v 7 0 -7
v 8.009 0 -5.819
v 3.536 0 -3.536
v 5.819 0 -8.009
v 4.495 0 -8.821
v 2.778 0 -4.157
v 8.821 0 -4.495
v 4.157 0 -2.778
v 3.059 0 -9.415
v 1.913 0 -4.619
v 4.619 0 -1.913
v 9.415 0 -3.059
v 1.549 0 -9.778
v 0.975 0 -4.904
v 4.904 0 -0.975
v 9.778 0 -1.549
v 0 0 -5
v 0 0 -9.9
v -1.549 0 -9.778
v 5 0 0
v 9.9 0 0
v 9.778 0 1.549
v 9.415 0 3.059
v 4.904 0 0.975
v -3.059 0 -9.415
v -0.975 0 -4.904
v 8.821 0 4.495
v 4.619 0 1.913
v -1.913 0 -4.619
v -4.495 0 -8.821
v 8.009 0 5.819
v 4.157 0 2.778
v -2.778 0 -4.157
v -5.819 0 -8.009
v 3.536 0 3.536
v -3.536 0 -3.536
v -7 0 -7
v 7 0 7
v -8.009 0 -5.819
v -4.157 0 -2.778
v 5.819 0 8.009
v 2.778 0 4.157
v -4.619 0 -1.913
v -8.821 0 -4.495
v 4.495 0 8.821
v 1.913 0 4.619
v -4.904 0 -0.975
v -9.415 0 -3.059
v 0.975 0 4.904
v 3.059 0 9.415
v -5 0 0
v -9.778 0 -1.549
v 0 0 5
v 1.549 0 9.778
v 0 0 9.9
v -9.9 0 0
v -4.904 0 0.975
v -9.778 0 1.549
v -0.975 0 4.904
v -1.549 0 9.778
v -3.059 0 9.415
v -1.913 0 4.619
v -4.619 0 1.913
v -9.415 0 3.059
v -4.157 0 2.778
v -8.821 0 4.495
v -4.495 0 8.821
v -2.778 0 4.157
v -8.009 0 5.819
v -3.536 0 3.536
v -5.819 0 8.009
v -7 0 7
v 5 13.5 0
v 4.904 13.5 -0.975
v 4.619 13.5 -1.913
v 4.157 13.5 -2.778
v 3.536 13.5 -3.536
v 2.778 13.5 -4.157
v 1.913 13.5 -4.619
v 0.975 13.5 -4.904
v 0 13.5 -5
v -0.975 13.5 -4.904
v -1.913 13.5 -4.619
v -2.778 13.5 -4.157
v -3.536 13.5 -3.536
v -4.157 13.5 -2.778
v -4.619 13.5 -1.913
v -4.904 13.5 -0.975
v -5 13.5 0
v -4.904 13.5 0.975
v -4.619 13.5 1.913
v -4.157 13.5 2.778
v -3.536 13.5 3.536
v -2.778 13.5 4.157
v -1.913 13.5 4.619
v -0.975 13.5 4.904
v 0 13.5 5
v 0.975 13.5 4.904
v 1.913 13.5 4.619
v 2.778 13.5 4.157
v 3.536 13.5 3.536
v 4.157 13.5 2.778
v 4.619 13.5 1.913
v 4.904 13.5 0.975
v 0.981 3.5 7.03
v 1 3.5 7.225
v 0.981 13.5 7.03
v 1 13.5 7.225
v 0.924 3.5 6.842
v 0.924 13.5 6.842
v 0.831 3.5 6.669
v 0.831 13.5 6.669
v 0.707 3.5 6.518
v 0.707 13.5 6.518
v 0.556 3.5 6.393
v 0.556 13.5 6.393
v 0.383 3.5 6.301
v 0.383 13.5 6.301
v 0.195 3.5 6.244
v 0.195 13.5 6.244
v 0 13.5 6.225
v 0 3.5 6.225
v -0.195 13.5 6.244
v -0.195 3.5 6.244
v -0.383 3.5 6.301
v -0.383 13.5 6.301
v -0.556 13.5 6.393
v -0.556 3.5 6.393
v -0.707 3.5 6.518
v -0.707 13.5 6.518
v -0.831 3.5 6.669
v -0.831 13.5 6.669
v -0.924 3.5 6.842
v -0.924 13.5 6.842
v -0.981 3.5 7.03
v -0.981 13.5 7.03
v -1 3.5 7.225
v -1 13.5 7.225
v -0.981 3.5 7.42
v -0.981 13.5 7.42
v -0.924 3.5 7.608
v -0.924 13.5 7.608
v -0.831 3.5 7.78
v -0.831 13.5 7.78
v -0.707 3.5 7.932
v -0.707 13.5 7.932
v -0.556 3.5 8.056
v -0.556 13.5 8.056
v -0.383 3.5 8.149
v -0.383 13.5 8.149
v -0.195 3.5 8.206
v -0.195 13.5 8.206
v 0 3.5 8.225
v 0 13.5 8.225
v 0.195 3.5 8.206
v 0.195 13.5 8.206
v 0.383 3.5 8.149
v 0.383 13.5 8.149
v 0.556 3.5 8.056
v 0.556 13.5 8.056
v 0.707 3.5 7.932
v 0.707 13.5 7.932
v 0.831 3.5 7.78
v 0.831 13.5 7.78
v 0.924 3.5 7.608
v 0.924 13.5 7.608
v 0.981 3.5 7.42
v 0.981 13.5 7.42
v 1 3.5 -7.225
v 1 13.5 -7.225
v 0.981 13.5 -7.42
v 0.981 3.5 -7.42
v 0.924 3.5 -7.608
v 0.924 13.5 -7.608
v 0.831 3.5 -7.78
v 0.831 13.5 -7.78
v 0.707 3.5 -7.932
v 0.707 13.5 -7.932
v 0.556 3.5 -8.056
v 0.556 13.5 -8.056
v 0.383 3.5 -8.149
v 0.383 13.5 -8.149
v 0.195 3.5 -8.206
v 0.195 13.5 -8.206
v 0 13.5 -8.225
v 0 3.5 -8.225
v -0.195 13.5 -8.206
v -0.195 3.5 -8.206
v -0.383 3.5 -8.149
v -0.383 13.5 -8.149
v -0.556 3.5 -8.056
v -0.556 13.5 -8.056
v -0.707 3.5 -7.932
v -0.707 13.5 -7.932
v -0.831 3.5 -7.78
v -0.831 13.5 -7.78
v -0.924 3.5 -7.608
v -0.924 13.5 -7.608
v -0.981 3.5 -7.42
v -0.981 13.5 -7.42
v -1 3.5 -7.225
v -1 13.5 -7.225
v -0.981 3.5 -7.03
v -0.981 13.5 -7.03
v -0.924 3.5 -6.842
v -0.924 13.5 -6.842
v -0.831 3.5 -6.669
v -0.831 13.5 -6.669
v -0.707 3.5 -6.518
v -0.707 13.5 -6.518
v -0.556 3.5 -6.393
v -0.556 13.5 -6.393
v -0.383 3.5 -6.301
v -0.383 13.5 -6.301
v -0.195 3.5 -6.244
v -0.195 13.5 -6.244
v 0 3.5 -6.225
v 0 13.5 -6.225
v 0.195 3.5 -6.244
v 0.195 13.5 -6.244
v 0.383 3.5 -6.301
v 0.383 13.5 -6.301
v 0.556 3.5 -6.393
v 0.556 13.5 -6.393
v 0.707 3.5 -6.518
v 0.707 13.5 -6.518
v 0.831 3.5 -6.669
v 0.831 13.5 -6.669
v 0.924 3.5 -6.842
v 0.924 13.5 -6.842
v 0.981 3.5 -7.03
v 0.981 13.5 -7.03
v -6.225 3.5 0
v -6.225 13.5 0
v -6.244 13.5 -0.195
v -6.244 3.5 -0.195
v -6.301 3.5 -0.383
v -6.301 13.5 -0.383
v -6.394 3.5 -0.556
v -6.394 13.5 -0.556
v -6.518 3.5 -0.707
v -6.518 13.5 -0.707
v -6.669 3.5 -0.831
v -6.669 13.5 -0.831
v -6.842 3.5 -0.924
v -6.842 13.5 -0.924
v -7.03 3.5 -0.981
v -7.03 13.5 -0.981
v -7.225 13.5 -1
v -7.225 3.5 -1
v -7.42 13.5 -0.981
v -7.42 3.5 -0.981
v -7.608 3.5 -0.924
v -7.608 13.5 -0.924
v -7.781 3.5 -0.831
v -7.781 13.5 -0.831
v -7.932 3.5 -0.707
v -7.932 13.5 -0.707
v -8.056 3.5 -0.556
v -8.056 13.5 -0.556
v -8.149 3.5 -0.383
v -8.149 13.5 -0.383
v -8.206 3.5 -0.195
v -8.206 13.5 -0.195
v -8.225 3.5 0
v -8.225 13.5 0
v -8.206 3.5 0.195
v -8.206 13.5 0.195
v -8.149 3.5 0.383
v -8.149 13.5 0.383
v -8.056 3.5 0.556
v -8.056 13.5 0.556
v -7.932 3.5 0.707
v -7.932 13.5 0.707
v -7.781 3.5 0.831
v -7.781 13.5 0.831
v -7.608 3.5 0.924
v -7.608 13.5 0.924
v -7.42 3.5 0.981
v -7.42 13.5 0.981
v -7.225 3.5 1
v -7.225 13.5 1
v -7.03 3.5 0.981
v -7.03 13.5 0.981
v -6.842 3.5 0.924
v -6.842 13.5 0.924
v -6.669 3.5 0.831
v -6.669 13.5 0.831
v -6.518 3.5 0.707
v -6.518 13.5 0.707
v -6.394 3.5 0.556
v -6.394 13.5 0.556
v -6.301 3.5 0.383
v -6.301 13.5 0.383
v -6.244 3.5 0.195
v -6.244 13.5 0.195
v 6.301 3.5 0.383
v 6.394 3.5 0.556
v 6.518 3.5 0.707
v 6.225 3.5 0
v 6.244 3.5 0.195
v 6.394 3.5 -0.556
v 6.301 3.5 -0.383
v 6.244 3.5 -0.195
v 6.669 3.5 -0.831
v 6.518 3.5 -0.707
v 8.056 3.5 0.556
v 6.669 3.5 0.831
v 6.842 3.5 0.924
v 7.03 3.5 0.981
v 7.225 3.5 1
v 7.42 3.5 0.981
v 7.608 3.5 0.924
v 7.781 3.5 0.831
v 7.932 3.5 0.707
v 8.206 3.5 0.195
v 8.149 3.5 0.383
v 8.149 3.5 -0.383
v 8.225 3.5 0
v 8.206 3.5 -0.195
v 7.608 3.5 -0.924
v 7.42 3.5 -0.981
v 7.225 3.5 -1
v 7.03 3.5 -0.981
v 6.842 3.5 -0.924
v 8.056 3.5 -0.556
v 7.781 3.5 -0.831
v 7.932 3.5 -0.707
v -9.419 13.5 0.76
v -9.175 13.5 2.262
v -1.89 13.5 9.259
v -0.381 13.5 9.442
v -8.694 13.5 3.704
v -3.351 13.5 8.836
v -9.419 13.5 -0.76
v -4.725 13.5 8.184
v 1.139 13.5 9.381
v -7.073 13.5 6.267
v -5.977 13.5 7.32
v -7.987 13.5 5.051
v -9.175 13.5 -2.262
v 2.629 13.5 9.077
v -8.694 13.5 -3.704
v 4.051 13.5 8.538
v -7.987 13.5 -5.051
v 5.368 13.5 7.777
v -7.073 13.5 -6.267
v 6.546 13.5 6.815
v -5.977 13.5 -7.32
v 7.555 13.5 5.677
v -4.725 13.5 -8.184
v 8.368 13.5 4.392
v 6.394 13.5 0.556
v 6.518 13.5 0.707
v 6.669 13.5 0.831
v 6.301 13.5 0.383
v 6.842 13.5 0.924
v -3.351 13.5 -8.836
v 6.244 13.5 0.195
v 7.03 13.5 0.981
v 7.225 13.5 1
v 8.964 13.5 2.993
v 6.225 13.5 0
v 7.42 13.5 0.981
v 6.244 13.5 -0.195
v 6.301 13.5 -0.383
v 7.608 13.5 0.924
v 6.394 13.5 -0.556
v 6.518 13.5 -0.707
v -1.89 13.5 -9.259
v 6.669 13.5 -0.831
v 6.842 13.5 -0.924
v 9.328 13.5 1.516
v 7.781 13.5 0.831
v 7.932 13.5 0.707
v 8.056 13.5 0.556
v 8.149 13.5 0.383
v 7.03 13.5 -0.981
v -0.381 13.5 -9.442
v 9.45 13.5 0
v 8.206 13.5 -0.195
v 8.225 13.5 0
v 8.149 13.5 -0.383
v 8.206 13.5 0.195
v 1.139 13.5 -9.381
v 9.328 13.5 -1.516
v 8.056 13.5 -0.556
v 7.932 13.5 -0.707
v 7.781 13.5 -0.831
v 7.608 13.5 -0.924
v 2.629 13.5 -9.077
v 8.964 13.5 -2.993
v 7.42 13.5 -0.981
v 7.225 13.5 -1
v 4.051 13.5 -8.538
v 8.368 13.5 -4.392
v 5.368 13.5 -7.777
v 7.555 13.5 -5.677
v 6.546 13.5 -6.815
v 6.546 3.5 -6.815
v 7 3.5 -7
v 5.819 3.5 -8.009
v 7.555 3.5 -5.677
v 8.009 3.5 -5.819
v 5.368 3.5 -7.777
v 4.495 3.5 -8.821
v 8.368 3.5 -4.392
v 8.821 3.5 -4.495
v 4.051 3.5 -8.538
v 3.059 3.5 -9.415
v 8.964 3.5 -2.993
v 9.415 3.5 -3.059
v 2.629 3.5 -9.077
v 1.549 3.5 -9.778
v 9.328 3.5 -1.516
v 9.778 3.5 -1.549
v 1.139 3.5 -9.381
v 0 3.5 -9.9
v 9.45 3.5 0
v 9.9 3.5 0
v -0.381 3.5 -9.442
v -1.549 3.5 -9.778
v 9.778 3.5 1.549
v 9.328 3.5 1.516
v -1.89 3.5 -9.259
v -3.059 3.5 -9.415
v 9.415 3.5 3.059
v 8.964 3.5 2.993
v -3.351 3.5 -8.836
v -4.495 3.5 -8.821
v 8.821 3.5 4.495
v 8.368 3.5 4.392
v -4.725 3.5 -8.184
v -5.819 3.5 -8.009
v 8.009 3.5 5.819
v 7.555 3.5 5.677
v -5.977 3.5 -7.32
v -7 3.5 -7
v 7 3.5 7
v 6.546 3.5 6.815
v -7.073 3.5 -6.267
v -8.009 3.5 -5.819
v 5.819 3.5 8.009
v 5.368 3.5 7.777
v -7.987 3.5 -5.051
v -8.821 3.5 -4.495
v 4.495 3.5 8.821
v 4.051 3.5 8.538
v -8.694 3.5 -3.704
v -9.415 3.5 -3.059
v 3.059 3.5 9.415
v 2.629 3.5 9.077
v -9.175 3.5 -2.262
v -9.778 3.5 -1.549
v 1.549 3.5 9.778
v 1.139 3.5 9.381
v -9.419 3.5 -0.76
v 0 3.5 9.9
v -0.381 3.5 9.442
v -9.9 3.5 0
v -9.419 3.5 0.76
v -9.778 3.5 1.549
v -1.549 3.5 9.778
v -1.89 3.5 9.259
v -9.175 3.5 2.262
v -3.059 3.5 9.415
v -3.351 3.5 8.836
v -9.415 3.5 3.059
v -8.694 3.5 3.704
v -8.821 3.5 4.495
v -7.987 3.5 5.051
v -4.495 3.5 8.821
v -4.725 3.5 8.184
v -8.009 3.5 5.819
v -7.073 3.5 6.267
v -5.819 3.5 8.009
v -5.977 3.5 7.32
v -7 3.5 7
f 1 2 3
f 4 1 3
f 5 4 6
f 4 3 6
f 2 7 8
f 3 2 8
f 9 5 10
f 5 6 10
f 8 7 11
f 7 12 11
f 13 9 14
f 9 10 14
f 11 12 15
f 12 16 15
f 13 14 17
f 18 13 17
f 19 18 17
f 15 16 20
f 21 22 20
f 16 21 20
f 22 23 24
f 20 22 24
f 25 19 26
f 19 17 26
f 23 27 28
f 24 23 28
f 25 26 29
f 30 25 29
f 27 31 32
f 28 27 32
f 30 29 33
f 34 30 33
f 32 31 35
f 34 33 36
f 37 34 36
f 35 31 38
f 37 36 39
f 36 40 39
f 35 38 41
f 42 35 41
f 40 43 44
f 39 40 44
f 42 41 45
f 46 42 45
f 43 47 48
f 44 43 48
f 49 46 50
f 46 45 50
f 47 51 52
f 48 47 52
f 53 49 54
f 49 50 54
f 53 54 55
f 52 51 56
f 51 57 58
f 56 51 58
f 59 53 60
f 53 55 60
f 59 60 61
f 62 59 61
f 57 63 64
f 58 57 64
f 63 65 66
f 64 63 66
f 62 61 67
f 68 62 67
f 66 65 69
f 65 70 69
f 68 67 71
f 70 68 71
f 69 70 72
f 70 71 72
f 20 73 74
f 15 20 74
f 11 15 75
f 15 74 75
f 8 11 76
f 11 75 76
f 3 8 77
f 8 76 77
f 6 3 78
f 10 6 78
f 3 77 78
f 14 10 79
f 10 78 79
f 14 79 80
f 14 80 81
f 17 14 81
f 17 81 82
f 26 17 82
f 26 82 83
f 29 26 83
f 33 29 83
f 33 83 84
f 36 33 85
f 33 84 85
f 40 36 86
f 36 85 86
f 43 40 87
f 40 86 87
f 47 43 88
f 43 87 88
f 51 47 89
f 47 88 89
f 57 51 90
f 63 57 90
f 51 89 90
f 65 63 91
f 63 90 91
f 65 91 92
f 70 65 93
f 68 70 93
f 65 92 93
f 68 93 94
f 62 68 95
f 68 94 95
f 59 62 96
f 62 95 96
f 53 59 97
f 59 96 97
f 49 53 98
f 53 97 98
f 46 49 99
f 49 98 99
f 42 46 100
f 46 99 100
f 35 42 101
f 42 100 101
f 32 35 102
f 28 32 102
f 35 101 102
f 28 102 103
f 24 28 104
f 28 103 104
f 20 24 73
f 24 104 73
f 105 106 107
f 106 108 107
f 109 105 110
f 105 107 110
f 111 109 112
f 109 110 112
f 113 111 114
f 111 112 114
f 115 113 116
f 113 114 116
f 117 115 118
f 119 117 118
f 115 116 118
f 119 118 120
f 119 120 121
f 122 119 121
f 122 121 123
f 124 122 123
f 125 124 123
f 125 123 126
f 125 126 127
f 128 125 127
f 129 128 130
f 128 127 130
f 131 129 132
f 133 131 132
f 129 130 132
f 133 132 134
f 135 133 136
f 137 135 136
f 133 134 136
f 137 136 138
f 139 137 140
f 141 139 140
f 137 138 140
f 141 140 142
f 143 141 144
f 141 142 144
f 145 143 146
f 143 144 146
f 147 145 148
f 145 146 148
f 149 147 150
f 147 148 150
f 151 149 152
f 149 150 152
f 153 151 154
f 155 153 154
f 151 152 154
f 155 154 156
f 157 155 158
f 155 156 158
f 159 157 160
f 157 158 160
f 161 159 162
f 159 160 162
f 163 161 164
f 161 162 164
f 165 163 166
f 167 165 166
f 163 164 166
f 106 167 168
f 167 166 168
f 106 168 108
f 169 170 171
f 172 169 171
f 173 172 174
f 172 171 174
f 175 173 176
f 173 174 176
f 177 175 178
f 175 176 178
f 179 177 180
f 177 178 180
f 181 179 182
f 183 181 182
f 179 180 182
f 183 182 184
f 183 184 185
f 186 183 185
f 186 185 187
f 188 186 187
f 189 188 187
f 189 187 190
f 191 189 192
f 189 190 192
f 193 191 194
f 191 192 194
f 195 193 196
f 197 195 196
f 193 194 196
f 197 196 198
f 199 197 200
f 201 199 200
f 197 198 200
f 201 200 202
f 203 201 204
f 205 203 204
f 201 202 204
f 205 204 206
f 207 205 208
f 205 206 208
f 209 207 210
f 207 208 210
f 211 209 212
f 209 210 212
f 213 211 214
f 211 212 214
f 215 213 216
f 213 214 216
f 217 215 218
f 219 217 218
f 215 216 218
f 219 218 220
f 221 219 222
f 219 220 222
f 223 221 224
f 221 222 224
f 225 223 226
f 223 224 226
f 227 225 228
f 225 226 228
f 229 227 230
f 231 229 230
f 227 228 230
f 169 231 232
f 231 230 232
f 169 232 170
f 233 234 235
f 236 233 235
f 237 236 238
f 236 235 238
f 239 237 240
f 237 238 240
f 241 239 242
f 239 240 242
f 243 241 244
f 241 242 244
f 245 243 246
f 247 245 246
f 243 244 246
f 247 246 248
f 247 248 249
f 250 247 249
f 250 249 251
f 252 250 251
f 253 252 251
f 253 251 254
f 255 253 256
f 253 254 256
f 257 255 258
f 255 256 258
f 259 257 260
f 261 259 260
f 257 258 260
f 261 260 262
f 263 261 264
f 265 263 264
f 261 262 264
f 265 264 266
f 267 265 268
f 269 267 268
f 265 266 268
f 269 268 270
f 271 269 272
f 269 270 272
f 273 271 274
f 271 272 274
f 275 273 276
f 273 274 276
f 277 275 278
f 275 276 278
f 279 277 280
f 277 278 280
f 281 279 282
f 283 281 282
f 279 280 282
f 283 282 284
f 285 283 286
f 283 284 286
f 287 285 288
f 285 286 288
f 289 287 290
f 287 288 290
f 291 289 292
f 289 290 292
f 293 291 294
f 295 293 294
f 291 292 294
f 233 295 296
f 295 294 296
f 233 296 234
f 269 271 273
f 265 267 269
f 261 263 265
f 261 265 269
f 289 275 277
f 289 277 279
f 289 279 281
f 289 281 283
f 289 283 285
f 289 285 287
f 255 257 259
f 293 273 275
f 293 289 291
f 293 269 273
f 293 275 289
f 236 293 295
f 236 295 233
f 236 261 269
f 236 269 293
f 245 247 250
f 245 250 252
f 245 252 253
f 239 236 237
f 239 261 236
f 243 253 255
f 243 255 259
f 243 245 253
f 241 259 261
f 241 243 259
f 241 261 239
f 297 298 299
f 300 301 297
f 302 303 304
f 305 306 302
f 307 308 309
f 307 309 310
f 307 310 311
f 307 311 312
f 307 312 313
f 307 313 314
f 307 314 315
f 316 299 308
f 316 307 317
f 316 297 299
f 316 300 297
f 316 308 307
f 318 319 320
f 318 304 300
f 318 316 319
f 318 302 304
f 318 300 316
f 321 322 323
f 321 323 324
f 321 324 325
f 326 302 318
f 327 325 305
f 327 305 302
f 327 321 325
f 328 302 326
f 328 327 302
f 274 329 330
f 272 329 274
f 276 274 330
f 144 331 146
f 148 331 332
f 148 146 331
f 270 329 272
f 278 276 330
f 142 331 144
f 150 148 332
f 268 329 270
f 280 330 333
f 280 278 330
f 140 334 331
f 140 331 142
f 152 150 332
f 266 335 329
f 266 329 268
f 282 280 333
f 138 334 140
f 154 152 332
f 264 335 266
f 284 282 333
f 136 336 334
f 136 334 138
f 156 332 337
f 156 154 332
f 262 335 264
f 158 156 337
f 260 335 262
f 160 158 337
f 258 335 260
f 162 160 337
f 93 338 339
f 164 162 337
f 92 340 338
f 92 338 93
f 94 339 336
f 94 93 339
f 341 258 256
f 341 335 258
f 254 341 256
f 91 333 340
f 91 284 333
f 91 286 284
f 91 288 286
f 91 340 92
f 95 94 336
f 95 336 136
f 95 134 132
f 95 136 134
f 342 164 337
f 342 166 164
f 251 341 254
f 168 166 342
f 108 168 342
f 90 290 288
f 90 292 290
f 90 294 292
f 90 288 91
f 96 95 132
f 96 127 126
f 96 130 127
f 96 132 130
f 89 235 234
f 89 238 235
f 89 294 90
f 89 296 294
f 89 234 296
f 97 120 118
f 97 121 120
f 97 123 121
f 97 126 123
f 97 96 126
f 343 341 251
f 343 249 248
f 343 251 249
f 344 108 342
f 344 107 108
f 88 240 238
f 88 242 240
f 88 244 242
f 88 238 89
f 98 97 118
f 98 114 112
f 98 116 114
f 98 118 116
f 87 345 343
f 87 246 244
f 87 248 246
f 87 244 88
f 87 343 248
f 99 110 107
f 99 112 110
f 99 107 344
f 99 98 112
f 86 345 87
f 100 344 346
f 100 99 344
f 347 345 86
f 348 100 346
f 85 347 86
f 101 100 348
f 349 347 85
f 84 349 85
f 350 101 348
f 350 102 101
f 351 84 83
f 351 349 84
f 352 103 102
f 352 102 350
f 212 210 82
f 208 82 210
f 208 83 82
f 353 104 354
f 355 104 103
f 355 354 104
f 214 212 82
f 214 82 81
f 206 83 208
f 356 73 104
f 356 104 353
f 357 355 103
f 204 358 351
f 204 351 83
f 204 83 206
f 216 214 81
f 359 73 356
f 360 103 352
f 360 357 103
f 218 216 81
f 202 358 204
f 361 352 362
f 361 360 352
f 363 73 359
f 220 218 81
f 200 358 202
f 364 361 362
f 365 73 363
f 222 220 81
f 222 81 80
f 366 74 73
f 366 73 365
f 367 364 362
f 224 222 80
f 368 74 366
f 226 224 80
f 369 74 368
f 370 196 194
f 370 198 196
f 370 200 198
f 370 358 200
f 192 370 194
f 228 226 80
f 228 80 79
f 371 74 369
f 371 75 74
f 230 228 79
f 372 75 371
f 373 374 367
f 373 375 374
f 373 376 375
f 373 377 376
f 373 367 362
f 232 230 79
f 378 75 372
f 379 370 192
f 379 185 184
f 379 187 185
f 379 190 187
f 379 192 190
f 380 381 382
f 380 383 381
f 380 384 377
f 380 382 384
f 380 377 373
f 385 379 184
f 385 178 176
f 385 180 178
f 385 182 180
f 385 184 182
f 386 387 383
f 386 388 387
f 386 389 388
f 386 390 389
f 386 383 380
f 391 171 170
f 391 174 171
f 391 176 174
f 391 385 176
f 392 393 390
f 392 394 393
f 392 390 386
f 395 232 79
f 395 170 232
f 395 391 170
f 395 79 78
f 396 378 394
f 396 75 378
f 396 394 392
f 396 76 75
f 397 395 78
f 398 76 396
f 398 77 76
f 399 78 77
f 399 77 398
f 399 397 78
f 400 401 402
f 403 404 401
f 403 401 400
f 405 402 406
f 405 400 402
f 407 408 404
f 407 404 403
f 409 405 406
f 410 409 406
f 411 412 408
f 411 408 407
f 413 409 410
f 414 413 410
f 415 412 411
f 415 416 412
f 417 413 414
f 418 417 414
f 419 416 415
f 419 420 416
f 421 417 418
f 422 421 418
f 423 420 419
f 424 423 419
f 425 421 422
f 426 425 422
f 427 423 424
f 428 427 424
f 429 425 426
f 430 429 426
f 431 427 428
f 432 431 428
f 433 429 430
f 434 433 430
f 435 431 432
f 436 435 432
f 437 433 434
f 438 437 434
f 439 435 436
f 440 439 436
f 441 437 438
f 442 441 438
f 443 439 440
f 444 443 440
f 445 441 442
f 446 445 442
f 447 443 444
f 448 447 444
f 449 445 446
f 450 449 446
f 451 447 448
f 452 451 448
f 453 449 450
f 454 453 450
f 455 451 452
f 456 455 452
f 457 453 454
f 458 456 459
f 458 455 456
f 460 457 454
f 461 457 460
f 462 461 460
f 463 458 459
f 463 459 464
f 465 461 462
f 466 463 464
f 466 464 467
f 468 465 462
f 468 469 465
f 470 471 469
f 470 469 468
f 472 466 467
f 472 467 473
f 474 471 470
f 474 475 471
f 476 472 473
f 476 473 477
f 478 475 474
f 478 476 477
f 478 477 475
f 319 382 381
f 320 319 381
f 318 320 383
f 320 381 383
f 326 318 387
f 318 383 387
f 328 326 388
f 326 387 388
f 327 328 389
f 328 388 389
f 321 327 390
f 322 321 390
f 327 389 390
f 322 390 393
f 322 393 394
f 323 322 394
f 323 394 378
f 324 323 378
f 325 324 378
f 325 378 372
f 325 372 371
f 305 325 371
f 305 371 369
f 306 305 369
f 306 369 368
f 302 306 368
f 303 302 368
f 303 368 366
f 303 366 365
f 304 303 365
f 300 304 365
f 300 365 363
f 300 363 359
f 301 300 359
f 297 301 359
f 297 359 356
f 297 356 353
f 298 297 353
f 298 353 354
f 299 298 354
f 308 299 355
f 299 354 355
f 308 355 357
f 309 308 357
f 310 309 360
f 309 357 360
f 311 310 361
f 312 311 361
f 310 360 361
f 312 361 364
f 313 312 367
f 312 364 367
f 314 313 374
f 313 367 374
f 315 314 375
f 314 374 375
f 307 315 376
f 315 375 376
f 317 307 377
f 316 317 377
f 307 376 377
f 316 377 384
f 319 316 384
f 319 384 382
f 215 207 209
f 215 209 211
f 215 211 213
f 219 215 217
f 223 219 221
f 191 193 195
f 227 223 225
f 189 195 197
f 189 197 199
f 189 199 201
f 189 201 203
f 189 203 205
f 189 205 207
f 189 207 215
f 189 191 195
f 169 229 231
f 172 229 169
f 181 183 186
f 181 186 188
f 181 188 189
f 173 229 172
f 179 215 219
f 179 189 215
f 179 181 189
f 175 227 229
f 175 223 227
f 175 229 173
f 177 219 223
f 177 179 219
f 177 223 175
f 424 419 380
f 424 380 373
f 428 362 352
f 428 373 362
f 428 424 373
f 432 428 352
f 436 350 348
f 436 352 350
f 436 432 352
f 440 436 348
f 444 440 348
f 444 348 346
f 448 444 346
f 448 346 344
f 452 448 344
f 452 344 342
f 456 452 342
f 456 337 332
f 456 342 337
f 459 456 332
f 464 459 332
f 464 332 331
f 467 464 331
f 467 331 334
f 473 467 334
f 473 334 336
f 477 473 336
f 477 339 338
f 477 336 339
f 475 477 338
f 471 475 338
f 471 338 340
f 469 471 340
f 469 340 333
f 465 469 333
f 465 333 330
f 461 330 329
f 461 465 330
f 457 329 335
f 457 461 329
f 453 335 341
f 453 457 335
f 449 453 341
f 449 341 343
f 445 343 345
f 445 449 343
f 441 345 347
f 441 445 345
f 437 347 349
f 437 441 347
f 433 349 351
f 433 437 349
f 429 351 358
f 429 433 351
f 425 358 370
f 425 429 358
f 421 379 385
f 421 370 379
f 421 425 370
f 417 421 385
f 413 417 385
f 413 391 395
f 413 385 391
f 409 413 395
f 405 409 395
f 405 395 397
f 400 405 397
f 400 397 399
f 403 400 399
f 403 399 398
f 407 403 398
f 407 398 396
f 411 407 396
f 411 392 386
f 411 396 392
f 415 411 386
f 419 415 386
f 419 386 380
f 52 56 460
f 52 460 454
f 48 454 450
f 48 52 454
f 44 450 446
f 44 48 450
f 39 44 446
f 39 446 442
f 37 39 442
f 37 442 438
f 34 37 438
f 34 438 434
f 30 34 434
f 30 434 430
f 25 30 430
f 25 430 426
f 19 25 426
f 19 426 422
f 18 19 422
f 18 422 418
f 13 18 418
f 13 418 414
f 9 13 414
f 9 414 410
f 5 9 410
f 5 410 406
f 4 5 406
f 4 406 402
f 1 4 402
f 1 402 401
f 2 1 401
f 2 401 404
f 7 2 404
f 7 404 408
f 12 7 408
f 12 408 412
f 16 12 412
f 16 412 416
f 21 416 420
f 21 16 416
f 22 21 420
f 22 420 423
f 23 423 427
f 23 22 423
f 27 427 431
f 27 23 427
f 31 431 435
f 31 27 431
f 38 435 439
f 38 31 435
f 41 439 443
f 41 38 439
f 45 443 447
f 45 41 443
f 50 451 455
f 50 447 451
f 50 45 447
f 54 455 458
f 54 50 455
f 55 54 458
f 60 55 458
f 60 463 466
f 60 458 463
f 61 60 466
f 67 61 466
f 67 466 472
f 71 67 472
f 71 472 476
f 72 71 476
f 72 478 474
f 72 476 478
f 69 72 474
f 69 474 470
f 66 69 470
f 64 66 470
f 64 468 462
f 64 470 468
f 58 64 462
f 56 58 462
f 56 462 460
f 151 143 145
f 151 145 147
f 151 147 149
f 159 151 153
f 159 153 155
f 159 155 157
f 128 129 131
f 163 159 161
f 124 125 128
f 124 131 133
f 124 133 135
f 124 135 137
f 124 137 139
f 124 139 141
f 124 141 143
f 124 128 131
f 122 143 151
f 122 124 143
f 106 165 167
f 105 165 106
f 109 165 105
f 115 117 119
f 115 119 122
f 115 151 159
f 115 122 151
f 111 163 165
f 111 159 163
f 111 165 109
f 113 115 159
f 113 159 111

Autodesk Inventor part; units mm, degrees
ref_plane "YZ Plane" through (0, 0, 0) normal (1, 0, 0) x (0, 1, 0)
ref_plane "XZ Plane" through (0, 0, 0) normal (0, 1, 0) x (-1, 0, 0)
ref_plane "XY Plane" through (0, 0, 0) normal (0, 0, 1) x (1, 0, 0)
sketch "Boceto1" plane through (0, 0, 0) normal (0, 1, 0) x (-1, 0, 0)
  circle A0 centre (0, 0) radius 9.9
  dimension "d0" = 19.8
extrude "Extrusión1" add sketch "Boceto1" along normal blind 3.5
sketch "Boceto2" plane through (0, 3.5, 0) normal (0, 1, 0) x (1, 0, 0)
  circle A0 centre (0, 0) radius 9.45
  dimension "d3" = 18.9
extrude "Extrusión2" add sketch "Boceto2" along normal blind 10
sketch "Boceto3" plane through (0, 13.5, 0) normal (0, 1, 0) x (1, 0, 0)
  circle A0 centre (0, 0) radius 5
  dimension "d6" = 10
extrude "Extrusión3" cut sketch "Boceto3" against normal through all
sketch "Boceto4" plane through (0, 13.5, 0) normal (0, 1, 0) x (1, 0, 0)
  circle A0 centre (0, 0) radius 9.45 projected
  circle A1 centre (0, -7.2249) radius 1
  circle A2 centre (0, 7.2249) radius 1
  circle A3 centre (0, 0) radius 5 projected
  circle A4 centre (7.225, 0) radius 1
  circle A5 centre (-7.225, 0) radius 1
  dimension "d9" = 2
  dimension "d10" = 2
extrude "Extrusión4" cut sketch "Boceto4" against normal blind 10 contours A1 | A2 | A4 | A5
properties part number "EejeV2"
